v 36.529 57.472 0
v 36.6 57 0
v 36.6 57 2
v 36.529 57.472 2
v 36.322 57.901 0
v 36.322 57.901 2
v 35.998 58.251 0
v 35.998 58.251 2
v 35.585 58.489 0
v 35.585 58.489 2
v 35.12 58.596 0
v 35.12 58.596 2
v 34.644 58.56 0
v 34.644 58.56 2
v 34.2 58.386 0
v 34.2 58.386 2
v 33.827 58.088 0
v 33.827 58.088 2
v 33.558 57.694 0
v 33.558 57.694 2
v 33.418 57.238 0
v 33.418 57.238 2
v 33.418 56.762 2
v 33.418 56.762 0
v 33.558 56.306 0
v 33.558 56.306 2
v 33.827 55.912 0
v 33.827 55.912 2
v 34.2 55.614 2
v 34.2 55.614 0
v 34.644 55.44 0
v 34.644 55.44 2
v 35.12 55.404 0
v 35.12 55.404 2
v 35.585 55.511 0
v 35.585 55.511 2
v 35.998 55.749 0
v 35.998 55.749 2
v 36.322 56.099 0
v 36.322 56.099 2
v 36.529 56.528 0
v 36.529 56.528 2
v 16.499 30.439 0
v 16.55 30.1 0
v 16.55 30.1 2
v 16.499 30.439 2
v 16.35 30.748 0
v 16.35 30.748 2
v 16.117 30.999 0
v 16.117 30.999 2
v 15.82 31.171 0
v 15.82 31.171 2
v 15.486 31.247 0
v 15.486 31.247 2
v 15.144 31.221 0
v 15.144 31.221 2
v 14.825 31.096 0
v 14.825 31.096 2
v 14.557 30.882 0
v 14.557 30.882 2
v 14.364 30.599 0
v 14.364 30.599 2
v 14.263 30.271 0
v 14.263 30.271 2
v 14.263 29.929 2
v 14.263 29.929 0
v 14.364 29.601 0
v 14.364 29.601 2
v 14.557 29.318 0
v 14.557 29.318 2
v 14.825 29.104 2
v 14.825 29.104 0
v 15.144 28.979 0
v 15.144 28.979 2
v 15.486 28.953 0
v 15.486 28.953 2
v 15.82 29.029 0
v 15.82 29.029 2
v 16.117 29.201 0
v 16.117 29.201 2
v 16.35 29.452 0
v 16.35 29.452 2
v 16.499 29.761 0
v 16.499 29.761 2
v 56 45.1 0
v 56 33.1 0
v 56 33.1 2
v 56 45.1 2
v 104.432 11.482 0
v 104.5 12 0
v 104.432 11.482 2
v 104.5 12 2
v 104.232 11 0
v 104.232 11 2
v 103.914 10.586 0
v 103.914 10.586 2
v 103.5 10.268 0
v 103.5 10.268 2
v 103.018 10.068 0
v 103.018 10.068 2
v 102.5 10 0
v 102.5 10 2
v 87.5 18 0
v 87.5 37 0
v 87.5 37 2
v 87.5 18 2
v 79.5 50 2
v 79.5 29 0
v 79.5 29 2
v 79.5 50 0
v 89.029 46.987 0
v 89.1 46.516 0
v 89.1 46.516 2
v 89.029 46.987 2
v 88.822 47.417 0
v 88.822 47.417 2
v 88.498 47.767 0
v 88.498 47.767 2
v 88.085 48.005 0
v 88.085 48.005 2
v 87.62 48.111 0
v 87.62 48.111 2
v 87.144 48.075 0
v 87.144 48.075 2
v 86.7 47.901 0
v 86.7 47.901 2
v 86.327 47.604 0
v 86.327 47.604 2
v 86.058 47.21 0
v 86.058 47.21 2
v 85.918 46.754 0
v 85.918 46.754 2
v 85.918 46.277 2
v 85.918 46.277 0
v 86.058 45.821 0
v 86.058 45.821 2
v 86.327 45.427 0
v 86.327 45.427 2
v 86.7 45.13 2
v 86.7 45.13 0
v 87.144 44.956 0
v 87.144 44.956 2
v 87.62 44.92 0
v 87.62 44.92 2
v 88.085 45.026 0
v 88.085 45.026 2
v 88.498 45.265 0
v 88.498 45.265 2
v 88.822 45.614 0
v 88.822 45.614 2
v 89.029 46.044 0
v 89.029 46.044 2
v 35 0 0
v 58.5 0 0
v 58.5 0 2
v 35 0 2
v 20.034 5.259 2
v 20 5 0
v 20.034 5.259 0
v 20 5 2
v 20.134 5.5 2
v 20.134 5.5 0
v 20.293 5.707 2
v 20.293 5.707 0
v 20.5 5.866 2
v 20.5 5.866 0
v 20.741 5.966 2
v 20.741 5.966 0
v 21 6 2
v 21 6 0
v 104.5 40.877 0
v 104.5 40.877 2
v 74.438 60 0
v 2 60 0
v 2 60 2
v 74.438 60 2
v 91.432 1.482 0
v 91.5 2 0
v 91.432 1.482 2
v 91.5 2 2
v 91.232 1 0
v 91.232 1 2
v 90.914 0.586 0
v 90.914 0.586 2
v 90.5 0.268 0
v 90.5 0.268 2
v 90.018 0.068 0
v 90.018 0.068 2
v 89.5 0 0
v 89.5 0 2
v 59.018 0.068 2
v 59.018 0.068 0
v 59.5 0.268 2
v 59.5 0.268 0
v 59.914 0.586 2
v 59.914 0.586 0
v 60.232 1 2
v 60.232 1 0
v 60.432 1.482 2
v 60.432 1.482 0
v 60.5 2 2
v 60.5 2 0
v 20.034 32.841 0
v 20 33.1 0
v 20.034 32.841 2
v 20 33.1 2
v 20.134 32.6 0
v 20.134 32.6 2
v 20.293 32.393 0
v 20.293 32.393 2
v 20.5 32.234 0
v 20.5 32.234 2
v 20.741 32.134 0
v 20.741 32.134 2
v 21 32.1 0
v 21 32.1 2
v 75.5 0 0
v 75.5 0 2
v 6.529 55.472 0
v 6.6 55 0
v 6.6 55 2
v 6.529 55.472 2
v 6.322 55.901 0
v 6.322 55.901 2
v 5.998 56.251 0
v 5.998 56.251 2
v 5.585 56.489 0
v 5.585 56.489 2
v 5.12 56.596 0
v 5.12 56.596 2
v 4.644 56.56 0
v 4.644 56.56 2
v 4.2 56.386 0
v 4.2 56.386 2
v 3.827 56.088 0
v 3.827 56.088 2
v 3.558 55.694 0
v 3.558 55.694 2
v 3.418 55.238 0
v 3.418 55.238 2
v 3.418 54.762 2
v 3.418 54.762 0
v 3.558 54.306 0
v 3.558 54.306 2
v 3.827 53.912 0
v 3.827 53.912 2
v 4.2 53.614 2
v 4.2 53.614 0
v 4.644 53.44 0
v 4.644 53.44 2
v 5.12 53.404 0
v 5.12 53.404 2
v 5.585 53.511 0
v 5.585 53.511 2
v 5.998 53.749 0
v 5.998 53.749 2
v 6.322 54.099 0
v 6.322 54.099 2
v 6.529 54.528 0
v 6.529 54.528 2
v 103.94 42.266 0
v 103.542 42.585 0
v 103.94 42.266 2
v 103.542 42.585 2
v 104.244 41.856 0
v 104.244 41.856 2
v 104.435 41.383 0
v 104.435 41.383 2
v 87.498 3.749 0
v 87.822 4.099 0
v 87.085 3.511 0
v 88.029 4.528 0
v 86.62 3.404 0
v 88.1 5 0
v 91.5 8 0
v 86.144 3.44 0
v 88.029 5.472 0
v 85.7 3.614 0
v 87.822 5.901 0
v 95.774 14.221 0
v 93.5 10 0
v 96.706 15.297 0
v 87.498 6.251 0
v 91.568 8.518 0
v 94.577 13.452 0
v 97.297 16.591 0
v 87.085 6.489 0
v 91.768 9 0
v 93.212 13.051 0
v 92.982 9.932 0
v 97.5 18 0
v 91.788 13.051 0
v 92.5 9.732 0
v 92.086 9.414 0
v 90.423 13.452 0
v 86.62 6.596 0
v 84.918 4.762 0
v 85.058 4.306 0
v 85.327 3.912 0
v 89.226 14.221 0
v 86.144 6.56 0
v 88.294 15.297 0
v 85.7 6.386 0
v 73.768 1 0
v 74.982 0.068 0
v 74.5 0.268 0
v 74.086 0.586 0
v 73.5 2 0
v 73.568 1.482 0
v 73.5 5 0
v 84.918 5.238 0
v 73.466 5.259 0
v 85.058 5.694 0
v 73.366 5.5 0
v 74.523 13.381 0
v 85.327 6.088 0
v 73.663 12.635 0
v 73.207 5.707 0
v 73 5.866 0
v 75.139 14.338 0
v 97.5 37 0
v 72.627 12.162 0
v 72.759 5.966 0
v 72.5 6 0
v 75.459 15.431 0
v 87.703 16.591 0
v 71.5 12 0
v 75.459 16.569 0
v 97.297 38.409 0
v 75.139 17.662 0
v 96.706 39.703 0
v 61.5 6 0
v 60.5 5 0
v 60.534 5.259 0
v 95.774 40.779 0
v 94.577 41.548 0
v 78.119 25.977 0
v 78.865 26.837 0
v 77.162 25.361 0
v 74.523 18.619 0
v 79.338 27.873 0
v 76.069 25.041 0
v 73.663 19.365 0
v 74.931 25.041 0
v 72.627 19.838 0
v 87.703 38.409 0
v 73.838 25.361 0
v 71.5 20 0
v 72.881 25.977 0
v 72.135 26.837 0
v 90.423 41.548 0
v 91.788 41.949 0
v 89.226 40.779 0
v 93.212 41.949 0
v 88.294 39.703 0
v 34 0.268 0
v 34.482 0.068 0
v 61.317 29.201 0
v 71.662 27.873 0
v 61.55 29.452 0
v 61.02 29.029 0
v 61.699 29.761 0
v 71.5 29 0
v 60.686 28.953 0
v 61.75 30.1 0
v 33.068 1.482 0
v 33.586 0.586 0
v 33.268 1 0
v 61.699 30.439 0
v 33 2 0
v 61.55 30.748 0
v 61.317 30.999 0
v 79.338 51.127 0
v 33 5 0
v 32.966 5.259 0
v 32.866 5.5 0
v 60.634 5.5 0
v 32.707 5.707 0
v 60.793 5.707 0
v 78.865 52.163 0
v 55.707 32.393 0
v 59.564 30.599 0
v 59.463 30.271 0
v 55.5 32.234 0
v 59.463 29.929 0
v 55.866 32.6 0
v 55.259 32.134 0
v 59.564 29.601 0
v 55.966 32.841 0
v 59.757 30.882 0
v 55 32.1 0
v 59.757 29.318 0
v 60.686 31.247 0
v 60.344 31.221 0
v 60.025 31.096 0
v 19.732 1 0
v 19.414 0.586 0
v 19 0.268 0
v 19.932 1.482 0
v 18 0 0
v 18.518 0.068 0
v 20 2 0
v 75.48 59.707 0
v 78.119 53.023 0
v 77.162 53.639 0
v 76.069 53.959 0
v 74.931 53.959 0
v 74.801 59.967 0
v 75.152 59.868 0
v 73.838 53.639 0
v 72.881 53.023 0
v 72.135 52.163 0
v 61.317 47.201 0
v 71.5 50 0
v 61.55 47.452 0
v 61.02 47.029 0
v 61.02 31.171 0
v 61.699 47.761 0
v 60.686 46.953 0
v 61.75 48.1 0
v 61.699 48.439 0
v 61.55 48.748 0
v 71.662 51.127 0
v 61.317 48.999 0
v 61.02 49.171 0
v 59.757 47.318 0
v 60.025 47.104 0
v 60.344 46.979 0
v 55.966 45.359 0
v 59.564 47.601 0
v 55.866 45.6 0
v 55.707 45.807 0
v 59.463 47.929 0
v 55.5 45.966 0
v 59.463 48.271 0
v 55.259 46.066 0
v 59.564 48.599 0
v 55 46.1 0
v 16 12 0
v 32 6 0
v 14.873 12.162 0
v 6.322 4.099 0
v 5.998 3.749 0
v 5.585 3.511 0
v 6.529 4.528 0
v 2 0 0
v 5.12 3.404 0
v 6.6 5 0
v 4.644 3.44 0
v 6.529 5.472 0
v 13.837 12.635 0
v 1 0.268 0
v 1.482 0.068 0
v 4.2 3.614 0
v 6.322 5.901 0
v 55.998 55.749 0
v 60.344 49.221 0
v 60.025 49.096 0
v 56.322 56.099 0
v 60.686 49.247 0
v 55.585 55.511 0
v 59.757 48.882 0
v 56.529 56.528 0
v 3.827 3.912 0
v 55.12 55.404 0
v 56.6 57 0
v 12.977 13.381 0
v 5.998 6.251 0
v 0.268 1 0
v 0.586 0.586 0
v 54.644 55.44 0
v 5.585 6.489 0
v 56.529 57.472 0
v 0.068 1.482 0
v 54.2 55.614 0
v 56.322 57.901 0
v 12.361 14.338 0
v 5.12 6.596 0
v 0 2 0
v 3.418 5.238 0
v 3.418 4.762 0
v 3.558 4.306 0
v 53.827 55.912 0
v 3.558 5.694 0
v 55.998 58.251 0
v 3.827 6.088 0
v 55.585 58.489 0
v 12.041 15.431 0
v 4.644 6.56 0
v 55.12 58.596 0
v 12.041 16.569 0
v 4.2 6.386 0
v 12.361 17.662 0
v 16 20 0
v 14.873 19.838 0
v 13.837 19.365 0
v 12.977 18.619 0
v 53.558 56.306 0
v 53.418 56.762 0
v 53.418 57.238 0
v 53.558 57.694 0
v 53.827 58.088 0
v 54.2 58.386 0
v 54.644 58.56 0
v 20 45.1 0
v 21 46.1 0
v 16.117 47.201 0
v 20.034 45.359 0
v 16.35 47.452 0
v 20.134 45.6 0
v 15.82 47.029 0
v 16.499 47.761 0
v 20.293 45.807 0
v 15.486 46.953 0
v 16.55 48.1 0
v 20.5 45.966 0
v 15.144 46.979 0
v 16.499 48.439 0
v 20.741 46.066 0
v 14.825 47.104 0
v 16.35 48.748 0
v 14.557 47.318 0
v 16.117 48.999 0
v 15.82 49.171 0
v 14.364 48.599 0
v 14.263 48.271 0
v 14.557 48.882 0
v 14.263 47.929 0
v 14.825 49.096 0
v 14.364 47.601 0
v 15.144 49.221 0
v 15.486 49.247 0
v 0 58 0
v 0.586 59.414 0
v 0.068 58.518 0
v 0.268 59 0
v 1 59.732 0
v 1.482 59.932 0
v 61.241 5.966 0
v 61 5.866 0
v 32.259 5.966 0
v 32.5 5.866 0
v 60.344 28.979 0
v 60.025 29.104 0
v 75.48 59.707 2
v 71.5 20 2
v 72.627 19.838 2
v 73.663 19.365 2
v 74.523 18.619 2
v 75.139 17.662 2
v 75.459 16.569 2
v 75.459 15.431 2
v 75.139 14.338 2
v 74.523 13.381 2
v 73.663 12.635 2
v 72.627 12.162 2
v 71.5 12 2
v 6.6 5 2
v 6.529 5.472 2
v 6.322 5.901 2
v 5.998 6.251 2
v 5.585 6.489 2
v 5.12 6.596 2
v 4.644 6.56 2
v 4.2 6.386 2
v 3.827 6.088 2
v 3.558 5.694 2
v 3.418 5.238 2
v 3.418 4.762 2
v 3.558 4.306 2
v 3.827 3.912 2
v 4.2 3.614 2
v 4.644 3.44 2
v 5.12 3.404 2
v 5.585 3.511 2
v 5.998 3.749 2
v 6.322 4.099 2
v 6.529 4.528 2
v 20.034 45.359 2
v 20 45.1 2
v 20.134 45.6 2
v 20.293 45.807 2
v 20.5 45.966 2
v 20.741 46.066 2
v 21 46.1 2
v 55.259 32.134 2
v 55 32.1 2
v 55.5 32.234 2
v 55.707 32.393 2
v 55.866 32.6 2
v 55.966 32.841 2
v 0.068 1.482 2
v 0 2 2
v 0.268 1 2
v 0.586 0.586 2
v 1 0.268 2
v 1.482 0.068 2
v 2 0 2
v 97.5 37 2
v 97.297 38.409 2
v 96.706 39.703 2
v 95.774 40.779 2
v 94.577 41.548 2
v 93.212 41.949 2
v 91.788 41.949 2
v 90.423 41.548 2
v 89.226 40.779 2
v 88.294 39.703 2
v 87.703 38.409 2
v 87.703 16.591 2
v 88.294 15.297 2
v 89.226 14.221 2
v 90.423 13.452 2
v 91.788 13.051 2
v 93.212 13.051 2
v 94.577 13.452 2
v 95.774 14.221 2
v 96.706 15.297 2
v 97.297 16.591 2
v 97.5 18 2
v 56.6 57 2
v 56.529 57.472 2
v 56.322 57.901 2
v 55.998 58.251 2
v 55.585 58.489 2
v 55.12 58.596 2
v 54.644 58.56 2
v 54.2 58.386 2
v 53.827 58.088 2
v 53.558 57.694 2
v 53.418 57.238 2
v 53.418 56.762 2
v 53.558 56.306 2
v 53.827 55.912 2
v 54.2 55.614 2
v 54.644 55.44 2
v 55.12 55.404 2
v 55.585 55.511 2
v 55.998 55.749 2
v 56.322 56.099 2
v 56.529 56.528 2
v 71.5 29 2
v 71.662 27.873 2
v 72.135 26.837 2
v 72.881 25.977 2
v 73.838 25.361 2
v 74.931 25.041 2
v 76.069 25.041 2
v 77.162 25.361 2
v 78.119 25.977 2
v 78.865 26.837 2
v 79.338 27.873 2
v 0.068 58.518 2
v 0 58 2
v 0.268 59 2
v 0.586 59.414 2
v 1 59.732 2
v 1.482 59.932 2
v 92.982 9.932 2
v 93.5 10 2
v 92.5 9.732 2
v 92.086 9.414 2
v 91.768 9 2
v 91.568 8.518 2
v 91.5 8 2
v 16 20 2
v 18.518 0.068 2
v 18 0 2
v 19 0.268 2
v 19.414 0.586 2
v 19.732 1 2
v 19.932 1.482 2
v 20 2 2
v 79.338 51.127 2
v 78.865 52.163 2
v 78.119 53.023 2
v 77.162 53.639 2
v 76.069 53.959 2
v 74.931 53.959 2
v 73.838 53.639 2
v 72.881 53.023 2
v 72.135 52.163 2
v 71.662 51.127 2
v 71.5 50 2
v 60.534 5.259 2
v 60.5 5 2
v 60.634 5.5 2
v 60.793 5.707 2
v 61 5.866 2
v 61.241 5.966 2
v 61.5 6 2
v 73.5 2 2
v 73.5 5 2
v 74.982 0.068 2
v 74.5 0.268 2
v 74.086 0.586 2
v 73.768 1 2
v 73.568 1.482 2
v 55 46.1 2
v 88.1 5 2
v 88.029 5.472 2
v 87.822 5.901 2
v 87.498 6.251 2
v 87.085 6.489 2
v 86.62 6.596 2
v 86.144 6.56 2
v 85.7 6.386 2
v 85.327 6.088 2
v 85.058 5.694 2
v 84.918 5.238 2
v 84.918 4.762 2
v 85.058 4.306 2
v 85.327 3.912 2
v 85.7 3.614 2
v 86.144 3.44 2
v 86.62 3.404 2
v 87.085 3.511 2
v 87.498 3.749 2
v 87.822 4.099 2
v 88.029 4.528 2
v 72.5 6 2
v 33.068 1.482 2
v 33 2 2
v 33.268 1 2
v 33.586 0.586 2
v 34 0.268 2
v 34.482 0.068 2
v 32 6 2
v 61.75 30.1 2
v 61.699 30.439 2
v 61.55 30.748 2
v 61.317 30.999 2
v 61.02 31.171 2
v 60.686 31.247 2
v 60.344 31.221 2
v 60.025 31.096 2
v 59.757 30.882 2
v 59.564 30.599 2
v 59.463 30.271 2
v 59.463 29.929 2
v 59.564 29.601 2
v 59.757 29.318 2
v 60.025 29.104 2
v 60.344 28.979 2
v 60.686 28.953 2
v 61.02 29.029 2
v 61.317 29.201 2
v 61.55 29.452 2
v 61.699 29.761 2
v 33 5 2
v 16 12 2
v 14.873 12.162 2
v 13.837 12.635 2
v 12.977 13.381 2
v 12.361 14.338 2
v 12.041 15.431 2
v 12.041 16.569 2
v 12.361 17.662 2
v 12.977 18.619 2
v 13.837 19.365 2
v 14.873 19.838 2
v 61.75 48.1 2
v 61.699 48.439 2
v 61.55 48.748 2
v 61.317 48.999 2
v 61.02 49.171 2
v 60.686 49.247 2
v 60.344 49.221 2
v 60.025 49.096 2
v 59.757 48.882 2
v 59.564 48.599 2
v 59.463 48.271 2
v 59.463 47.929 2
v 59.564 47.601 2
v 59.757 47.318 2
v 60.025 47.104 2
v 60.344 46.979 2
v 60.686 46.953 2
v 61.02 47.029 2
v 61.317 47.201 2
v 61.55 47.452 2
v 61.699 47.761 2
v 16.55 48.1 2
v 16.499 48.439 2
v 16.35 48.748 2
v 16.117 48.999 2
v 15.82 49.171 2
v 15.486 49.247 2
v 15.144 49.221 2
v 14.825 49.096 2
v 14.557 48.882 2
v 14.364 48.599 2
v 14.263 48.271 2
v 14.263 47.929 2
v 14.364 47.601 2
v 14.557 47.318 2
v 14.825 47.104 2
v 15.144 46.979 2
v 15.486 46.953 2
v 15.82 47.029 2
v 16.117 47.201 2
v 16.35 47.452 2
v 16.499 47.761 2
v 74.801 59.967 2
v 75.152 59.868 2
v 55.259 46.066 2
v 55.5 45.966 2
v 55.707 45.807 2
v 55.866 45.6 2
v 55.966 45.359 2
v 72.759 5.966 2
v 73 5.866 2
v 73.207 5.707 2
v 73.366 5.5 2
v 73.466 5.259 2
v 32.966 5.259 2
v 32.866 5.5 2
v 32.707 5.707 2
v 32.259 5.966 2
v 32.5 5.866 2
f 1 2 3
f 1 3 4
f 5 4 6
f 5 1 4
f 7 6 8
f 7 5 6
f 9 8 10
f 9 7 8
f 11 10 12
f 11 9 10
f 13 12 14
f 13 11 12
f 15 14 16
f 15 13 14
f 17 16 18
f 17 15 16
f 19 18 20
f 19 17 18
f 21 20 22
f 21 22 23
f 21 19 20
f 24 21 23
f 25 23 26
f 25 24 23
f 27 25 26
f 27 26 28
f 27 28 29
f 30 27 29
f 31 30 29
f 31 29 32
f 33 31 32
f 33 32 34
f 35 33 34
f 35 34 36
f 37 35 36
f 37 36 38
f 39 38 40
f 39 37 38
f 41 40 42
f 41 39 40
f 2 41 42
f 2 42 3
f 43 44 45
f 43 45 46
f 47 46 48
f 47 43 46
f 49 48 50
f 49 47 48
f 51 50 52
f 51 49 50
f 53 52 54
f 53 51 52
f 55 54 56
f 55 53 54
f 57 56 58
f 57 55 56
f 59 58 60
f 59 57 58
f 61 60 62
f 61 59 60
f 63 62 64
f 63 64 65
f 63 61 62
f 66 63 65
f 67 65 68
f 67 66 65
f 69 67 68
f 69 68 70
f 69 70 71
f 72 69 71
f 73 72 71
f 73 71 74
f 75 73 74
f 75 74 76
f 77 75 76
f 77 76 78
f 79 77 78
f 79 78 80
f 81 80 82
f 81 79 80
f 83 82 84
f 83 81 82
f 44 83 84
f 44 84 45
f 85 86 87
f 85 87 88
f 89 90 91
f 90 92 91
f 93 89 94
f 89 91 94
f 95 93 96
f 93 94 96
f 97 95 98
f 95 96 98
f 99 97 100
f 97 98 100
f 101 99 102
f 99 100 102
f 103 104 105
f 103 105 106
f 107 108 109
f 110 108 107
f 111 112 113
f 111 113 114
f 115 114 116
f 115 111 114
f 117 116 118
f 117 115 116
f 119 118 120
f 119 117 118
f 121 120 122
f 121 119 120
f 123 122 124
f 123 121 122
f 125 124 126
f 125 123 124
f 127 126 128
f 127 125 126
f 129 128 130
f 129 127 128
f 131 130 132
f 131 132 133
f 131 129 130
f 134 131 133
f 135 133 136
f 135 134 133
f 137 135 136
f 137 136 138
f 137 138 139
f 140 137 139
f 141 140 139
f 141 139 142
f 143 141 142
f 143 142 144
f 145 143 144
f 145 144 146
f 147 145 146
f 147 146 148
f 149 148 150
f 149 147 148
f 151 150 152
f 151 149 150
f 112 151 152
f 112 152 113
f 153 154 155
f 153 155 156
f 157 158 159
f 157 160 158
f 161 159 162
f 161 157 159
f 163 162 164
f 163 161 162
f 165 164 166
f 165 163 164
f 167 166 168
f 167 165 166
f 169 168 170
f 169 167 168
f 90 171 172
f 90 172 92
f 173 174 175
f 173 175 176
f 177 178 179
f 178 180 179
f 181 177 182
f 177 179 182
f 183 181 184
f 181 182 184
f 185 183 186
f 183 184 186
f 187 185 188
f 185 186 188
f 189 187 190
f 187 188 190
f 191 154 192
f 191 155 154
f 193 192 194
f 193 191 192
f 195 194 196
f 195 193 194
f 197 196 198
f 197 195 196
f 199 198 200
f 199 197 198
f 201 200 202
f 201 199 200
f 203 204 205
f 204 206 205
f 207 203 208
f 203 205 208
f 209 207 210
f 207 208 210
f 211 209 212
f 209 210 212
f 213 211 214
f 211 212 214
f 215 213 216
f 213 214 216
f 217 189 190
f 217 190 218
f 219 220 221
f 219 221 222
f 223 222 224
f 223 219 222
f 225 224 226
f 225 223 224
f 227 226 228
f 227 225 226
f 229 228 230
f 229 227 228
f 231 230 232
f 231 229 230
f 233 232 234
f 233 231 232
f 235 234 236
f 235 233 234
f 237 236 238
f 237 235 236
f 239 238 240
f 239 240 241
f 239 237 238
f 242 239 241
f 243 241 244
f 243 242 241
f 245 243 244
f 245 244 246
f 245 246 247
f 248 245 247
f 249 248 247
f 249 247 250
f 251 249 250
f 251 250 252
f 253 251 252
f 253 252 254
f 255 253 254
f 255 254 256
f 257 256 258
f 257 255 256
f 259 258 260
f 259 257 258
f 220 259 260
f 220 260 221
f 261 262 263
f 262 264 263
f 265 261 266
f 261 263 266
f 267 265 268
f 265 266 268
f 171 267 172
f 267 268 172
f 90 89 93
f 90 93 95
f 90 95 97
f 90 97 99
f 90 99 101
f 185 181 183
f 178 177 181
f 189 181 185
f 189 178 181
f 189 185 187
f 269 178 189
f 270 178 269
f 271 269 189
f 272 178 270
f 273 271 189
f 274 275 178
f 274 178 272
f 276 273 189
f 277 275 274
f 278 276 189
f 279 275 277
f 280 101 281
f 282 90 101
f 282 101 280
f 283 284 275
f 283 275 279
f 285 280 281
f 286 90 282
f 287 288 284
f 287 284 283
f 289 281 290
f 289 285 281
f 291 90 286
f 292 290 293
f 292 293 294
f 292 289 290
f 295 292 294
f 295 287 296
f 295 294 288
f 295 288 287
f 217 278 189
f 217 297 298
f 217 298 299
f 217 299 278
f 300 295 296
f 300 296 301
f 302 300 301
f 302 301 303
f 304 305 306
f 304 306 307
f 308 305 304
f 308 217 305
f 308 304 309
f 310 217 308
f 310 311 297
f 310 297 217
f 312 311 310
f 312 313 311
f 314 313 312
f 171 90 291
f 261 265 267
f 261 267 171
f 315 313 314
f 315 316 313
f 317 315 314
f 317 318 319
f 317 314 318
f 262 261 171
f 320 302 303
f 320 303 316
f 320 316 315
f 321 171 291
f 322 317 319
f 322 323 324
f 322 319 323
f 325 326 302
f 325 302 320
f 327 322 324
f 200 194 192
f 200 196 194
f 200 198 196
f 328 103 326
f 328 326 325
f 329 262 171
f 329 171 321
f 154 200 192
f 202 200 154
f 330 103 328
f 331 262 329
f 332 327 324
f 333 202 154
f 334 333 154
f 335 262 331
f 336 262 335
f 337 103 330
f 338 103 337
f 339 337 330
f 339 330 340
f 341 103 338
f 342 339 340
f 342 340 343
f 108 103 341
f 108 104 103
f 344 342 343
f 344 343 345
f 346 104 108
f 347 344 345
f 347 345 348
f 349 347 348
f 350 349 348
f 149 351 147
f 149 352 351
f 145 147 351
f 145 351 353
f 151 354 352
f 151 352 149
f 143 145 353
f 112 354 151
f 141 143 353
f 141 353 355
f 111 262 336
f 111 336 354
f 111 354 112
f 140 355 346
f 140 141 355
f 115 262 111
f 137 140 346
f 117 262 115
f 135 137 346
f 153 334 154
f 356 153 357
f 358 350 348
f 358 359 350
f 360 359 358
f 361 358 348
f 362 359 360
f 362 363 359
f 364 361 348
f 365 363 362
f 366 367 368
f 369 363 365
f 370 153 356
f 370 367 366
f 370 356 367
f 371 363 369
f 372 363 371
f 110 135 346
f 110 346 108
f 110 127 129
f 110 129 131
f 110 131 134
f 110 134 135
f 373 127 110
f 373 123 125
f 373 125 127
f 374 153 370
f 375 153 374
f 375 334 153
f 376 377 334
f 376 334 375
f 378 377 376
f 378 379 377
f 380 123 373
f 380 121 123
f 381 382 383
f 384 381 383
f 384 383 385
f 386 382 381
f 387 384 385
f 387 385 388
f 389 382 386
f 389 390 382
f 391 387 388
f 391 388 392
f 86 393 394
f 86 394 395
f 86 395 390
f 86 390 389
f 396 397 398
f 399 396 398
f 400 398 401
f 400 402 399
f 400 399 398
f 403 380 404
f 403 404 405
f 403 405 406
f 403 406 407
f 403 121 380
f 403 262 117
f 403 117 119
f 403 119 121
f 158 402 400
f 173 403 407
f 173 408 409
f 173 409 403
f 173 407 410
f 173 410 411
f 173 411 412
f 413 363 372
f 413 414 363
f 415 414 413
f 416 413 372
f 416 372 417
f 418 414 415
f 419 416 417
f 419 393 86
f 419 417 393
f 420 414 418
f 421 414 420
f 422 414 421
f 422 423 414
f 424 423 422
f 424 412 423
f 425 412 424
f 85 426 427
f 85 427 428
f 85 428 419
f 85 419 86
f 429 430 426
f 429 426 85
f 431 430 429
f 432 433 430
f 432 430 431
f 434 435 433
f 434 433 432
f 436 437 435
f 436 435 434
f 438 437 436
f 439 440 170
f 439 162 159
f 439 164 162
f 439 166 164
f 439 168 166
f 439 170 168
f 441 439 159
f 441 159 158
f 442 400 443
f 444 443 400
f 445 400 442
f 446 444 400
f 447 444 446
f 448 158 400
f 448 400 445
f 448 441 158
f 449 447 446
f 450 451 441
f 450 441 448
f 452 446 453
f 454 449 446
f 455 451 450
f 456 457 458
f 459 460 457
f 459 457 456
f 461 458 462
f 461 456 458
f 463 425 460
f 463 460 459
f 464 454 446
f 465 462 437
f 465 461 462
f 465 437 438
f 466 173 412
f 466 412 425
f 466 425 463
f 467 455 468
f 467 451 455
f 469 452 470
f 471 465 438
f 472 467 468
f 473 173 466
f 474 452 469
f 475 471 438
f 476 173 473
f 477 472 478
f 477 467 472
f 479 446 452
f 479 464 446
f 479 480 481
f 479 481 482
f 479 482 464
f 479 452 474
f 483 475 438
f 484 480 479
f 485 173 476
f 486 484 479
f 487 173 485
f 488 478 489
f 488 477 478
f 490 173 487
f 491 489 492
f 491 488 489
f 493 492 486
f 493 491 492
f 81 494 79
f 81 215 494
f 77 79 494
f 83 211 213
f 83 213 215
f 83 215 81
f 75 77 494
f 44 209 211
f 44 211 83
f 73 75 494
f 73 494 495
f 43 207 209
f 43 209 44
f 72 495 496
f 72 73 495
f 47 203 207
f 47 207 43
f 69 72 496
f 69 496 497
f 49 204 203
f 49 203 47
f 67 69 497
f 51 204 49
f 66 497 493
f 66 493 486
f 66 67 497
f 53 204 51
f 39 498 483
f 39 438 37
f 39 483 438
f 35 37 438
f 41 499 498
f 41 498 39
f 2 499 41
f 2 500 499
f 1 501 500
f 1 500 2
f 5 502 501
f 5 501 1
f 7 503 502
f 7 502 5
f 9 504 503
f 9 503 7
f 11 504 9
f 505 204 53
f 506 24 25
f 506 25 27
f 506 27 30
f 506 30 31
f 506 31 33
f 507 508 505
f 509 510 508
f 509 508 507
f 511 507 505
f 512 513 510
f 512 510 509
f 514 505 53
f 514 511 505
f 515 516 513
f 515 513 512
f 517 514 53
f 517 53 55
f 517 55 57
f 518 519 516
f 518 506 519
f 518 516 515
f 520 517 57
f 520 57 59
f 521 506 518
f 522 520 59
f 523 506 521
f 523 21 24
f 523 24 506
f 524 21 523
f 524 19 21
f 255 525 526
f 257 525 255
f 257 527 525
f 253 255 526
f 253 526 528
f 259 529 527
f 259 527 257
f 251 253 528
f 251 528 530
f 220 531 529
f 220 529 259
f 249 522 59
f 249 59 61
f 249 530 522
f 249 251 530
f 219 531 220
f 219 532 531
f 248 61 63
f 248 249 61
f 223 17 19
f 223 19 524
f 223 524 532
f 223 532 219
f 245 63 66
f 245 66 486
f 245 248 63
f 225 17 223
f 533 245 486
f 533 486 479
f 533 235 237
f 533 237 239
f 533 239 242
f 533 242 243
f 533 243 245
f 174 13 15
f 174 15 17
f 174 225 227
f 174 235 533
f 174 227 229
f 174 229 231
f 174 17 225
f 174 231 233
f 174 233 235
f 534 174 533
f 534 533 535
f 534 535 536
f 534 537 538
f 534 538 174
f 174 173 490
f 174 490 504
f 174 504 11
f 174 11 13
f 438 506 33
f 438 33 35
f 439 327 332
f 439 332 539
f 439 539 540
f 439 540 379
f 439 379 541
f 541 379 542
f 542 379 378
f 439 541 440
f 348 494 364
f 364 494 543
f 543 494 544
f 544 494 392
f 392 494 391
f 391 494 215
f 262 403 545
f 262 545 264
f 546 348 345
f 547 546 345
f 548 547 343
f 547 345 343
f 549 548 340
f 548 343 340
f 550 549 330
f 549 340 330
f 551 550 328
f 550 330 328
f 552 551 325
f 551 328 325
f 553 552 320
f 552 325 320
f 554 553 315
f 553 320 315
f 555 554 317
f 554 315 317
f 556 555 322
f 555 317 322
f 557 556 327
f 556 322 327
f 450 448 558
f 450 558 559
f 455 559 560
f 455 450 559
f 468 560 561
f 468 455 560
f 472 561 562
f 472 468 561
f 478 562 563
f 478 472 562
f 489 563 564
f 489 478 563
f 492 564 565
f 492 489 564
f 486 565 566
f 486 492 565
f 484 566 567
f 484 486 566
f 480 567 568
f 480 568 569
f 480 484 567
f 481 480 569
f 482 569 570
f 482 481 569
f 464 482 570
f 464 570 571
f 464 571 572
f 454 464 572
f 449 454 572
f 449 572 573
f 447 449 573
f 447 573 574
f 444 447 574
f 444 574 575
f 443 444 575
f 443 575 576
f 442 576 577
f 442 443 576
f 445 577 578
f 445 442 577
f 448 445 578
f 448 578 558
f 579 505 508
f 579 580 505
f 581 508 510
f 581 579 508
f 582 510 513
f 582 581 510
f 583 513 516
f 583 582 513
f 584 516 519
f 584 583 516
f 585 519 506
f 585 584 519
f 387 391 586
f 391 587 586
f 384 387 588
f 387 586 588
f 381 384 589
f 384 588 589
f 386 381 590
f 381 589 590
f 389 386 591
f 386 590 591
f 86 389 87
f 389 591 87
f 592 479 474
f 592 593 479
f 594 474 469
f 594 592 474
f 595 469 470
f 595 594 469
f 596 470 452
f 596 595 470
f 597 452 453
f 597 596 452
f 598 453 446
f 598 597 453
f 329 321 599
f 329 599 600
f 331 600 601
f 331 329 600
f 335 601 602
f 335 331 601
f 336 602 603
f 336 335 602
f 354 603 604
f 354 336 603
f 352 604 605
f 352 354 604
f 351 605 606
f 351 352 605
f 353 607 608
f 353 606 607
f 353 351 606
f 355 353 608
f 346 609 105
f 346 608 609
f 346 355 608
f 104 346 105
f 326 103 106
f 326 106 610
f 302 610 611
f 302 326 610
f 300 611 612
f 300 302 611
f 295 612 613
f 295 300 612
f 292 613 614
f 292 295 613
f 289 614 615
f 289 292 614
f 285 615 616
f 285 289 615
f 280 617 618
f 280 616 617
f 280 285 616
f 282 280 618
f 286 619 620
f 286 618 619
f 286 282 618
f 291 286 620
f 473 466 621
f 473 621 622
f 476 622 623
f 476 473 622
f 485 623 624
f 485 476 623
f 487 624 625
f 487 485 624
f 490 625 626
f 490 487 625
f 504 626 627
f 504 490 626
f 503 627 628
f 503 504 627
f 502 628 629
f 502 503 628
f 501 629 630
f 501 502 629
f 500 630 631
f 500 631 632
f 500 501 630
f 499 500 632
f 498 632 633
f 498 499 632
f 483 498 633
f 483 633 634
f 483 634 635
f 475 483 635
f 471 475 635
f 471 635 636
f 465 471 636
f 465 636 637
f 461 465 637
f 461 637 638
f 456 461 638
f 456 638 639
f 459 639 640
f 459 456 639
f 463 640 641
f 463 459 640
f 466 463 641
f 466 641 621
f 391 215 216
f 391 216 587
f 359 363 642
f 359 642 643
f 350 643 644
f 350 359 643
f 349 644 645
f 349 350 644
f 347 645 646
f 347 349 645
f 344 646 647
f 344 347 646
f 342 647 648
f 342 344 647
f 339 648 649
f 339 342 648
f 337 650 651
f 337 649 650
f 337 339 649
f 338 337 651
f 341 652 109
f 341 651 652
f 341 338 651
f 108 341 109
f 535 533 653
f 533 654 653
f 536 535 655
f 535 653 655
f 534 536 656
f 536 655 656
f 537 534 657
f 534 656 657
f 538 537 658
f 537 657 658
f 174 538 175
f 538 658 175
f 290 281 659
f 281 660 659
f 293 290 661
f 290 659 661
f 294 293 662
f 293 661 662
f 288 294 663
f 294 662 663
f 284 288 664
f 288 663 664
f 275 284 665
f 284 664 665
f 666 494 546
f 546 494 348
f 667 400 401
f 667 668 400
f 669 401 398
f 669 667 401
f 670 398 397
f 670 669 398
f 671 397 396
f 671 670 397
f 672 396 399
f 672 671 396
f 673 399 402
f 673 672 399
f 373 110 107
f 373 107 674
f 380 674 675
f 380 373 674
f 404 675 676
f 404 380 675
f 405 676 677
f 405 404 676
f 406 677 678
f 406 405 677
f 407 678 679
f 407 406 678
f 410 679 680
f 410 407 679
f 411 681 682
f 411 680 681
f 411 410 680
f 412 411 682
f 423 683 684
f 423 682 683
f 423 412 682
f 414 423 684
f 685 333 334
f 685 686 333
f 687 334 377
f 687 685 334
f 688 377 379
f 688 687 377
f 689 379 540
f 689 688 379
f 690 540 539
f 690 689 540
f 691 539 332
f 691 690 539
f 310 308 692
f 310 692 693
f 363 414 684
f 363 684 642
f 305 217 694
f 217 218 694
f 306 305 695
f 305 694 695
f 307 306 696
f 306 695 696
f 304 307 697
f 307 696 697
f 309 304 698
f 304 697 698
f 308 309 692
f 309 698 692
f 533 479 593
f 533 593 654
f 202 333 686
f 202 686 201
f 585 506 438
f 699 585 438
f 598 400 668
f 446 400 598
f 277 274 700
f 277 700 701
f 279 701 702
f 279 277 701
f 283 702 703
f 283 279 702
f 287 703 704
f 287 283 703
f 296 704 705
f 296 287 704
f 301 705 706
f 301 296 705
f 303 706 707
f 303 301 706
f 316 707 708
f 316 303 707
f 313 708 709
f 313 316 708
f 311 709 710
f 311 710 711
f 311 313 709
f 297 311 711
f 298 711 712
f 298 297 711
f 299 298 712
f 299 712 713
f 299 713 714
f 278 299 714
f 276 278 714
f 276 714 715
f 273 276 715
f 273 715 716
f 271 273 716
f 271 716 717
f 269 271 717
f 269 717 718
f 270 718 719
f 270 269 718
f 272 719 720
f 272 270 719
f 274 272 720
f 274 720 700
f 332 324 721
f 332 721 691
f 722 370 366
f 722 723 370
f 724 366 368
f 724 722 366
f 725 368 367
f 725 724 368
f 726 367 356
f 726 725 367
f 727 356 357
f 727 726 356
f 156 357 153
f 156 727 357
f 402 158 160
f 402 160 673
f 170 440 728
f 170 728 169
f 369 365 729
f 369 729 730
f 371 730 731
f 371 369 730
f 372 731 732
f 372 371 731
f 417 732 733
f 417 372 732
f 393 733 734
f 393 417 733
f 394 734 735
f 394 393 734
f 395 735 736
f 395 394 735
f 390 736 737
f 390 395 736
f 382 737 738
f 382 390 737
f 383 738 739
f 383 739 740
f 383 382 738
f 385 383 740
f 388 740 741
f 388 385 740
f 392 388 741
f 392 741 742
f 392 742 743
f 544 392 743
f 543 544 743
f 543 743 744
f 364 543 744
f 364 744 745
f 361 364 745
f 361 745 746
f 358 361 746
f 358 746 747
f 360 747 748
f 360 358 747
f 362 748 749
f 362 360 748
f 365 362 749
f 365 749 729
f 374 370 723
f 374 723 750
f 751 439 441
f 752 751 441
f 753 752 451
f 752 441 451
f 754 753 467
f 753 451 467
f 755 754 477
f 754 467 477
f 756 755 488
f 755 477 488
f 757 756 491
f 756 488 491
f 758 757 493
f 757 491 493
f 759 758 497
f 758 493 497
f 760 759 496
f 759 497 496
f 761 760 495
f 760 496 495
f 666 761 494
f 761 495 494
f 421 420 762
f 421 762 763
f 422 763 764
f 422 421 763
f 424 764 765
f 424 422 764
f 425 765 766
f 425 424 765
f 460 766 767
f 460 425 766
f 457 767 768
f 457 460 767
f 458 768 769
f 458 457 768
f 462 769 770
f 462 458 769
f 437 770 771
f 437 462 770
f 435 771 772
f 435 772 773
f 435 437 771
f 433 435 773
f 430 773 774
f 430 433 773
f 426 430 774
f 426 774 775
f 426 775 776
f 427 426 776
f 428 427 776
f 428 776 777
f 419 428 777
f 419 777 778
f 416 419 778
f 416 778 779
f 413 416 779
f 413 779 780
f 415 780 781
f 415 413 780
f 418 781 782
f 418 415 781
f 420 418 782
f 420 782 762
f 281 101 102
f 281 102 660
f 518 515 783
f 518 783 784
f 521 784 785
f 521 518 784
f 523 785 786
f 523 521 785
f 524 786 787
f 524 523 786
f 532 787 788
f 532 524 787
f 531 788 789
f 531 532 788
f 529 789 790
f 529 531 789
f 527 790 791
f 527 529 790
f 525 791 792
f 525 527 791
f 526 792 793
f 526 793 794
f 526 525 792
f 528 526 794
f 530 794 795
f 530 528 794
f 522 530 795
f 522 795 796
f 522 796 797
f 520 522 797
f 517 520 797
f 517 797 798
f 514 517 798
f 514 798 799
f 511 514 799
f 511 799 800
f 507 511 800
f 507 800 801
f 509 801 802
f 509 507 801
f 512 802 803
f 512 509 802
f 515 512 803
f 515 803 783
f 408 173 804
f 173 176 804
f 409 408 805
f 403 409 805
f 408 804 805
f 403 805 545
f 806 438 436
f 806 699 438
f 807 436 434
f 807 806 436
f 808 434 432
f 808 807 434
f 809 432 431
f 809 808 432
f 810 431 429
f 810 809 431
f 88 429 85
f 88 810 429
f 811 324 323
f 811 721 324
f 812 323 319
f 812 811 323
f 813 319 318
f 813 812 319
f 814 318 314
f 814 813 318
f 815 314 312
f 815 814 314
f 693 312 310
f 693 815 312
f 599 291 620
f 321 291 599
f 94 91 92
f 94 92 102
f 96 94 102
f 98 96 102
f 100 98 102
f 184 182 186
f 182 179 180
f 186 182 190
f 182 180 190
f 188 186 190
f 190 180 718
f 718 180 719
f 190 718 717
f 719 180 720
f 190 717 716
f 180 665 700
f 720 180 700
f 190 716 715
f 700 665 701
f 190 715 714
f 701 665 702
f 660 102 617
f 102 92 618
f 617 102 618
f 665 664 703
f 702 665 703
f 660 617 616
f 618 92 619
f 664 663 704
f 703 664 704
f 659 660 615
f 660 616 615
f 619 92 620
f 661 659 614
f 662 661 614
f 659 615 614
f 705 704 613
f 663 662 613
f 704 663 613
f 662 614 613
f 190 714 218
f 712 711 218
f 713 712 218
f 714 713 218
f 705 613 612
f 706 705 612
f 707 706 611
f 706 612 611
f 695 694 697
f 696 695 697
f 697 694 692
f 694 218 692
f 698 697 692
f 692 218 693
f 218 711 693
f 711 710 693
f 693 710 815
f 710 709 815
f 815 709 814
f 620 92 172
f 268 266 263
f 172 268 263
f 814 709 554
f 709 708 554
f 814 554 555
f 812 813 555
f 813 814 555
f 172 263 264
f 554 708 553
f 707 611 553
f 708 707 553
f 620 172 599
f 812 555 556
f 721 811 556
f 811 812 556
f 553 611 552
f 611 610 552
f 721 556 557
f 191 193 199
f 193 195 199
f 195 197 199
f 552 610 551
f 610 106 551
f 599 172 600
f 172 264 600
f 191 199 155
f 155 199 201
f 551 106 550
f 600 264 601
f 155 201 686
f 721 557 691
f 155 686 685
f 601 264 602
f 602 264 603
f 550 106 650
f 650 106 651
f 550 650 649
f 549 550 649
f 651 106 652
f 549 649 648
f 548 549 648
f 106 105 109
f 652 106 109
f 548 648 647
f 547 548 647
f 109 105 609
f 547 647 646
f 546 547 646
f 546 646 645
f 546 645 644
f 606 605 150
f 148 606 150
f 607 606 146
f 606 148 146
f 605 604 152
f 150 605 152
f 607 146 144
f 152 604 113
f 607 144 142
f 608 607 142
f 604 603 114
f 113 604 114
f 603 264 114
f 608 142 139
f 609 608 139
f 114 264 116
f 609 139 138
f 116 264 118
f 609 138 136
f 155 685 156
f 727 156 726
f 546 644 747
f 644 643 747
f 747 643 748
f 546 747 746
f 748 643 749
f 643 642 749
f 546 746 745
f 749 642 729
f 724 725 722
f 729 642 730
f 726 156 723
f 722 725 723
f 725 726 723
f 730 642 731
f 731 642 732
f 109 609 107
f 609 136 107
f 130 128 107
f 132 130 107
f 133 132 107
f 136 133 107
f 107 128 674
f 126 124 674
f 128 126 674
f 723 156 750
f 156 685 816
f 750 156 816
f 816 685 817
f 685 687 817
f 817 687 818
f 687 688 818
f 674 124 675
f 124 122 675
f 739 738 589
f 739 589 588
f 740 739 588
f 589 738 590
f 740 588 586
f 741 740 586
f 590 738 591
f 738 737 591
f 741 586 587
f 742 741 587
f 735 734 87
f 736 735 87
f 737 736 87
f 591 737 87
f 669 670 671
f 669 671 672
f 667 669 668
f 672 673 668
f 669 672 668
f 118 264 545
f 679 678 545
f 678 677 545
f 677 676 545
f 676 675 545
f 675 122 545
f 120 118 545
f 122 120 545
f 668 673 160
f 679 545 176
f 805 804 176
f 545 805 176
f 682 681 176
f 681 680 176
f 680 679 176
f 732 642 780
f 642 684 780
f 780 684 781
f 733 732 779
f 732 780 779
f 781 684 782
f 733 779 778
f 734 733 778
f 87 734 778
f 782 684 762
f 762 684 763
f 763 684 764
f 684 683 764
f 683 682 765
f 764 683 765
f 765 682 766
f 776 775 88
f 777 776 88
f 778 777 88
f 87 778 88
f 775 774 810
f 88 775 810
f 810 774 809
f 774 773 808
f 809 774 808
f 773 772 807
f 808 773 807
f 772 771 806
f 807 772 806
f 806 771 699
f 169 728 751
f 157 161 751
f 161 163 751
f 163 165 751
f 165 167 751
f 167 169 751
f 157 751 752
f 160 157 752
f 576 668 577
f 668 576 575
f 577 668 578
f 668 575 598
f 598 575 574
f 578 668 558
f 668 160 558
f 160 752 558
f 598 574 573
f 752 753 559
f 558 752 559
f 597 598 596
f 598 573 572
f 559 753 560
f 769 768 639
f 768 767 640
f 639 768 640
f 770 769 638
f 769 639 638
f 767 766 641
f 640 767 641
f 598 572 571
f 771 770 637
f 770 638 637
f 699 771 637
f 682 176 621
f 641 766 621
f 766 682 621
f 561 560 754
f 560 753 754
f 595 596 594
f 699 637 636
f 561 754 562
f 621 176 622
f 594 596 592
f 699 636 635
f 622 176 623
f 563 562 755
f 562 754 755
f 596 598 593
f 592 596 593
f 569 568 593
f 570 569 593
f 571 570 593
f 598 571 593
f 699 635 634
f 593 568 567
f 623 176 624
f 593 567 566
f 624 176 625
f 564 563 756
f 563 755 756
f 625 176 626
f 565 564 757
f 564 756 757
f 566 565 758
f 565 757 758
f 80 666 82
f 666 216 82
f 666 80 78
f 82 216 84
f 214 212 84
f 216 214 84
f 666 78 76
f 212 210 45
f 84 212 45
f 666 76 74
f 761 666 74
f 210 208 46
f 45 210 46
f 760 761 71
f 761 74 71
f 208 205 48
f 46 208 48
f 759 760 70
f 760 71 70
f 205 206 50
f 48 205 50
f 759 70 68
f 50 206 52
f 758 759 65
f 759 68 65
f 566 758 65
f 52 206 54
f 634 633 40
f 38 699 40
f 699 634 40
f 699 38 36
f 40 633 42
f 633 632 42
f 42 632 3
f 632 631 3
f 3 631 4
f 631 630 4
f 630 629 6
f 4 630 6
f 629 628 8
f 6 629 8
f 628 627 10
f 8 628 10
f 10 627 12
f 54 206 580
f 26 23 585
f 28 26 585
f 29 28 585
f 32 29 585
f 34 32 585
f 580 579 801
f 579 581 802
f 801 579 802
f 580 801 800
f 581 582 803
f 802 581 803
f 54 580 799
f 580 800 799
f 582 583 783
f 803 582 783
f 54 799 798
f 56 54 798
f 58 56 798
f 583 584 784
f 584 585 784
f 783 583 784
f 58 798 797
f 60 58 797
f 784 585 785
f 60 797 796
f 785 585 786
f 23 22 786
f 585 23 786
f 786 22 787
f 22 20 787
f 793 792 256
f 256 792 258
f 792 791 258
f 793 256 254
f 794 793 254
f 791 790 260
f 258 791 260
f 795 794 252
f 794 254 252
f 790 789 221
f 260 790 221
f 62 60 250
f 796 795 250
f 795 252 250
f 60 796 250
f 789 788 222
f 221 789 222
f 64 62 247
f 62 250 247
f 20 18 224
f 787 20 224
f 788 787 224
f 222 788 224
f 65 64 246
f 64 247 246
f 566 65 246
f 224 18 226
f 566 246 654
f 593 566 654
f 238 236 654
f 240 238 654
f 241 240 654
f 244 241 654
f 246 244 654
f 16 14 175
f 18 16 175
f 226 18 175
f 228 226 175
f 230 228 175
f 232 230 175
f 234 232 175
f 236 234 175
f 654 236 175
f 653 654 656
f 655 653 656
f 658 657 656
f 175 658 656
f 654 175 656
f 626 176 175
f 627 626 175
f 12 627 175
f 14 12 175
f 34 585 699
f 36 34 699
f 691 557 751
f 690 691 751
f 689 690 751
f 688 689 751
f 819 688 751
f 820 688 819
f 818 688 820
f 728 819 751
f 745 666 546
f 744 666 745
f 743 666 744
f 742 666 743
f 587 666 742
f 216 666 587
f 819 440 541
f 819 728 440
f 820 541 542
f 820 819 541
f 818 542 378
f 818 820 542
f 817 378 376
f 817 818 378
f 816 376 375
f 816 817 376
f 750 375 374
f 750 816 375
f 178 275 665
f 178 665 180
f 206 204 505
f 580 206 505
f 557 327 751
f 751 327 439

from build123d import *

# Parameters (mm, degrees)
SKETCH_1_R          = 1.6
SKETCH_1_R_2        = 1.15
SKETCH_1_W          = 36
SKETCH_1_H          = 14
EXTRUDE_1_DEPTH     = 2
CUT_EXTRUDE_1_DEPTH = 121.516596367
FILLET_1_R          = 2
FILLET_2_R          = 1
FILLET_3_R          = 1


with BuildPart() as part:
    # 草图1 → 凸台-拉伸1 (new body)
    with BuildSketch(Plane.XY):
        Polygon((0, 0), (0, 60), (75, 60), (104.5, 42), (104.5, 10), (91.5, 10), (91.5, 0), (73.5, 0), (73.5, 6), (60.5, 6), (60.5, 0), (33, 0), (33, 6), (20, 6), (20, 0), align=None)
        with Locations((86.5, 5)):
            Circle(SKETCH_1_R, mode=Mode.SUBTRACT)
        with Locations((5, 5)):
            Circle(SKETCH_1_R, mode=Mode.SUBTRACT)
        with Locations((60.6, 48.1)):
            Circle(SKETCH_1_R_2, mode=Mode.SUBTRACT)
        with Locations((60.6, 30.1)):
            Circle(SKETCH_1_R_2, mode=Mode.SUBTRACT)
        with Locations((15.4, 48.1)):
            Circle(SKETCH_1_R_2, mode=Mode.SUBTRACT)
        with Locations((15.4, 30.1)):
            Circle(SKETCH_1_R_2, mode=Mode.SUBTRACT)
        with Locations((87.5, 46.515606374)):
            Circle(SKETCH_1_R, mode=Mode.SUBTRACT)
        with Locations((55, 57)):
            Circle(SKETCH_1_R, mode=Mode.SUBTRACT)
        with Locations((35, 57)):
            Circle(SKETCH_1_R, mode=Mode.SUBTRACT)
        with Locations((5, 55)):
            Circle(SKETCH_1_R, mode=Mode.SUBTRACT)
        with BuildLine():
            Line((71.5, 12), (16, 12))
            ThreePointArc((16, 12), (12, 16), (16, 20))
            Line((16, 20), (71.5, 20))
            ThreePointArc((71.5, 20), (75.5, 16), (71.5, 12))
        make_face(mode=Mode.SUBTRACT)
        with Locations((38, 39.1)):
            Rectangle(SKETCH_1_W, SKETCH_1_H, mode=Mode.SUBTRACT)
    extrude(amount=EXTRUDE_1_DEPTH)

    # 草图2 → 切除-拉伸1 (cut, through all)
    with BuildSketch(Plane(origin=(0, 0, 0), x_dir=(-1, 0, 0), z_dir=(0, 0, -1))):
        with BuildLine():
            Line((-87.5, 37), (-87.5, 18))
            ThreePointArc((-87.5, 18), (-92.5, 13), (-97.5, 18))
            Line((-97.5, 18), (-97.5, 37))
            ThreePointArc((-97.5, 37), (-92.5, 42), (-87.5, 37))
        make_face()
        with BuildLine():
            Line((-71.5, 50), (-71.5, 29))
            ThreePointArc((-71.5, 29), (-75.5, 25), (-79.5, 29))
            Line((-79.5, 29), (-79.5, 50))
            ThreePointArc((-79.5, 50), (-75.5, 54), (-71.5, 50))
        make_face()
    extrude(amount=-CUT_EXTRUDE_1_DEPTH, mode=Mode.SUBTRACT)

    # 圆角1
    fillet_1_edges = [part.edges().sort_by_distance(p)[0] for p in [
        (0, 0, 1),
        (0, 60, 1),
        (75, 60, 1),
        (104.5, 42, 1),
        (104.5, 10, 1),
        (91.5, 10, 1),
        (91.5, 0, 1),
        (73.5, 0, 1),
        (60.5, 0, 1),
        (33, 0, 1),
        (20, 0, 1),
    ]]
    fillet(fillet_1_edges, radius=FILLET_1_R)

    # 圆角2
    fillet_2_edges = [part.edges().sort_by_distance(p)[0] for p in [
        (56, 32.1, 1),
        (56, 46.1, 1),
        (20, 46.1, 1),
        (20, 32.1, 1),
    ]]
    fillet(fillet_2_edges, radius=FILLET_2_R)

    # 圆角3
    fillet_3_edges = [part.edges().sort_by_distance(p)[0] for p in [
        (73.5, 6, 1),
        (60.5, 6, 1),
        (33, 6, 1),
        (20, 6, 1),
    ]]
    fillet(fillet_3_edges, radius=FILLET_3_R)


solid = part.part
